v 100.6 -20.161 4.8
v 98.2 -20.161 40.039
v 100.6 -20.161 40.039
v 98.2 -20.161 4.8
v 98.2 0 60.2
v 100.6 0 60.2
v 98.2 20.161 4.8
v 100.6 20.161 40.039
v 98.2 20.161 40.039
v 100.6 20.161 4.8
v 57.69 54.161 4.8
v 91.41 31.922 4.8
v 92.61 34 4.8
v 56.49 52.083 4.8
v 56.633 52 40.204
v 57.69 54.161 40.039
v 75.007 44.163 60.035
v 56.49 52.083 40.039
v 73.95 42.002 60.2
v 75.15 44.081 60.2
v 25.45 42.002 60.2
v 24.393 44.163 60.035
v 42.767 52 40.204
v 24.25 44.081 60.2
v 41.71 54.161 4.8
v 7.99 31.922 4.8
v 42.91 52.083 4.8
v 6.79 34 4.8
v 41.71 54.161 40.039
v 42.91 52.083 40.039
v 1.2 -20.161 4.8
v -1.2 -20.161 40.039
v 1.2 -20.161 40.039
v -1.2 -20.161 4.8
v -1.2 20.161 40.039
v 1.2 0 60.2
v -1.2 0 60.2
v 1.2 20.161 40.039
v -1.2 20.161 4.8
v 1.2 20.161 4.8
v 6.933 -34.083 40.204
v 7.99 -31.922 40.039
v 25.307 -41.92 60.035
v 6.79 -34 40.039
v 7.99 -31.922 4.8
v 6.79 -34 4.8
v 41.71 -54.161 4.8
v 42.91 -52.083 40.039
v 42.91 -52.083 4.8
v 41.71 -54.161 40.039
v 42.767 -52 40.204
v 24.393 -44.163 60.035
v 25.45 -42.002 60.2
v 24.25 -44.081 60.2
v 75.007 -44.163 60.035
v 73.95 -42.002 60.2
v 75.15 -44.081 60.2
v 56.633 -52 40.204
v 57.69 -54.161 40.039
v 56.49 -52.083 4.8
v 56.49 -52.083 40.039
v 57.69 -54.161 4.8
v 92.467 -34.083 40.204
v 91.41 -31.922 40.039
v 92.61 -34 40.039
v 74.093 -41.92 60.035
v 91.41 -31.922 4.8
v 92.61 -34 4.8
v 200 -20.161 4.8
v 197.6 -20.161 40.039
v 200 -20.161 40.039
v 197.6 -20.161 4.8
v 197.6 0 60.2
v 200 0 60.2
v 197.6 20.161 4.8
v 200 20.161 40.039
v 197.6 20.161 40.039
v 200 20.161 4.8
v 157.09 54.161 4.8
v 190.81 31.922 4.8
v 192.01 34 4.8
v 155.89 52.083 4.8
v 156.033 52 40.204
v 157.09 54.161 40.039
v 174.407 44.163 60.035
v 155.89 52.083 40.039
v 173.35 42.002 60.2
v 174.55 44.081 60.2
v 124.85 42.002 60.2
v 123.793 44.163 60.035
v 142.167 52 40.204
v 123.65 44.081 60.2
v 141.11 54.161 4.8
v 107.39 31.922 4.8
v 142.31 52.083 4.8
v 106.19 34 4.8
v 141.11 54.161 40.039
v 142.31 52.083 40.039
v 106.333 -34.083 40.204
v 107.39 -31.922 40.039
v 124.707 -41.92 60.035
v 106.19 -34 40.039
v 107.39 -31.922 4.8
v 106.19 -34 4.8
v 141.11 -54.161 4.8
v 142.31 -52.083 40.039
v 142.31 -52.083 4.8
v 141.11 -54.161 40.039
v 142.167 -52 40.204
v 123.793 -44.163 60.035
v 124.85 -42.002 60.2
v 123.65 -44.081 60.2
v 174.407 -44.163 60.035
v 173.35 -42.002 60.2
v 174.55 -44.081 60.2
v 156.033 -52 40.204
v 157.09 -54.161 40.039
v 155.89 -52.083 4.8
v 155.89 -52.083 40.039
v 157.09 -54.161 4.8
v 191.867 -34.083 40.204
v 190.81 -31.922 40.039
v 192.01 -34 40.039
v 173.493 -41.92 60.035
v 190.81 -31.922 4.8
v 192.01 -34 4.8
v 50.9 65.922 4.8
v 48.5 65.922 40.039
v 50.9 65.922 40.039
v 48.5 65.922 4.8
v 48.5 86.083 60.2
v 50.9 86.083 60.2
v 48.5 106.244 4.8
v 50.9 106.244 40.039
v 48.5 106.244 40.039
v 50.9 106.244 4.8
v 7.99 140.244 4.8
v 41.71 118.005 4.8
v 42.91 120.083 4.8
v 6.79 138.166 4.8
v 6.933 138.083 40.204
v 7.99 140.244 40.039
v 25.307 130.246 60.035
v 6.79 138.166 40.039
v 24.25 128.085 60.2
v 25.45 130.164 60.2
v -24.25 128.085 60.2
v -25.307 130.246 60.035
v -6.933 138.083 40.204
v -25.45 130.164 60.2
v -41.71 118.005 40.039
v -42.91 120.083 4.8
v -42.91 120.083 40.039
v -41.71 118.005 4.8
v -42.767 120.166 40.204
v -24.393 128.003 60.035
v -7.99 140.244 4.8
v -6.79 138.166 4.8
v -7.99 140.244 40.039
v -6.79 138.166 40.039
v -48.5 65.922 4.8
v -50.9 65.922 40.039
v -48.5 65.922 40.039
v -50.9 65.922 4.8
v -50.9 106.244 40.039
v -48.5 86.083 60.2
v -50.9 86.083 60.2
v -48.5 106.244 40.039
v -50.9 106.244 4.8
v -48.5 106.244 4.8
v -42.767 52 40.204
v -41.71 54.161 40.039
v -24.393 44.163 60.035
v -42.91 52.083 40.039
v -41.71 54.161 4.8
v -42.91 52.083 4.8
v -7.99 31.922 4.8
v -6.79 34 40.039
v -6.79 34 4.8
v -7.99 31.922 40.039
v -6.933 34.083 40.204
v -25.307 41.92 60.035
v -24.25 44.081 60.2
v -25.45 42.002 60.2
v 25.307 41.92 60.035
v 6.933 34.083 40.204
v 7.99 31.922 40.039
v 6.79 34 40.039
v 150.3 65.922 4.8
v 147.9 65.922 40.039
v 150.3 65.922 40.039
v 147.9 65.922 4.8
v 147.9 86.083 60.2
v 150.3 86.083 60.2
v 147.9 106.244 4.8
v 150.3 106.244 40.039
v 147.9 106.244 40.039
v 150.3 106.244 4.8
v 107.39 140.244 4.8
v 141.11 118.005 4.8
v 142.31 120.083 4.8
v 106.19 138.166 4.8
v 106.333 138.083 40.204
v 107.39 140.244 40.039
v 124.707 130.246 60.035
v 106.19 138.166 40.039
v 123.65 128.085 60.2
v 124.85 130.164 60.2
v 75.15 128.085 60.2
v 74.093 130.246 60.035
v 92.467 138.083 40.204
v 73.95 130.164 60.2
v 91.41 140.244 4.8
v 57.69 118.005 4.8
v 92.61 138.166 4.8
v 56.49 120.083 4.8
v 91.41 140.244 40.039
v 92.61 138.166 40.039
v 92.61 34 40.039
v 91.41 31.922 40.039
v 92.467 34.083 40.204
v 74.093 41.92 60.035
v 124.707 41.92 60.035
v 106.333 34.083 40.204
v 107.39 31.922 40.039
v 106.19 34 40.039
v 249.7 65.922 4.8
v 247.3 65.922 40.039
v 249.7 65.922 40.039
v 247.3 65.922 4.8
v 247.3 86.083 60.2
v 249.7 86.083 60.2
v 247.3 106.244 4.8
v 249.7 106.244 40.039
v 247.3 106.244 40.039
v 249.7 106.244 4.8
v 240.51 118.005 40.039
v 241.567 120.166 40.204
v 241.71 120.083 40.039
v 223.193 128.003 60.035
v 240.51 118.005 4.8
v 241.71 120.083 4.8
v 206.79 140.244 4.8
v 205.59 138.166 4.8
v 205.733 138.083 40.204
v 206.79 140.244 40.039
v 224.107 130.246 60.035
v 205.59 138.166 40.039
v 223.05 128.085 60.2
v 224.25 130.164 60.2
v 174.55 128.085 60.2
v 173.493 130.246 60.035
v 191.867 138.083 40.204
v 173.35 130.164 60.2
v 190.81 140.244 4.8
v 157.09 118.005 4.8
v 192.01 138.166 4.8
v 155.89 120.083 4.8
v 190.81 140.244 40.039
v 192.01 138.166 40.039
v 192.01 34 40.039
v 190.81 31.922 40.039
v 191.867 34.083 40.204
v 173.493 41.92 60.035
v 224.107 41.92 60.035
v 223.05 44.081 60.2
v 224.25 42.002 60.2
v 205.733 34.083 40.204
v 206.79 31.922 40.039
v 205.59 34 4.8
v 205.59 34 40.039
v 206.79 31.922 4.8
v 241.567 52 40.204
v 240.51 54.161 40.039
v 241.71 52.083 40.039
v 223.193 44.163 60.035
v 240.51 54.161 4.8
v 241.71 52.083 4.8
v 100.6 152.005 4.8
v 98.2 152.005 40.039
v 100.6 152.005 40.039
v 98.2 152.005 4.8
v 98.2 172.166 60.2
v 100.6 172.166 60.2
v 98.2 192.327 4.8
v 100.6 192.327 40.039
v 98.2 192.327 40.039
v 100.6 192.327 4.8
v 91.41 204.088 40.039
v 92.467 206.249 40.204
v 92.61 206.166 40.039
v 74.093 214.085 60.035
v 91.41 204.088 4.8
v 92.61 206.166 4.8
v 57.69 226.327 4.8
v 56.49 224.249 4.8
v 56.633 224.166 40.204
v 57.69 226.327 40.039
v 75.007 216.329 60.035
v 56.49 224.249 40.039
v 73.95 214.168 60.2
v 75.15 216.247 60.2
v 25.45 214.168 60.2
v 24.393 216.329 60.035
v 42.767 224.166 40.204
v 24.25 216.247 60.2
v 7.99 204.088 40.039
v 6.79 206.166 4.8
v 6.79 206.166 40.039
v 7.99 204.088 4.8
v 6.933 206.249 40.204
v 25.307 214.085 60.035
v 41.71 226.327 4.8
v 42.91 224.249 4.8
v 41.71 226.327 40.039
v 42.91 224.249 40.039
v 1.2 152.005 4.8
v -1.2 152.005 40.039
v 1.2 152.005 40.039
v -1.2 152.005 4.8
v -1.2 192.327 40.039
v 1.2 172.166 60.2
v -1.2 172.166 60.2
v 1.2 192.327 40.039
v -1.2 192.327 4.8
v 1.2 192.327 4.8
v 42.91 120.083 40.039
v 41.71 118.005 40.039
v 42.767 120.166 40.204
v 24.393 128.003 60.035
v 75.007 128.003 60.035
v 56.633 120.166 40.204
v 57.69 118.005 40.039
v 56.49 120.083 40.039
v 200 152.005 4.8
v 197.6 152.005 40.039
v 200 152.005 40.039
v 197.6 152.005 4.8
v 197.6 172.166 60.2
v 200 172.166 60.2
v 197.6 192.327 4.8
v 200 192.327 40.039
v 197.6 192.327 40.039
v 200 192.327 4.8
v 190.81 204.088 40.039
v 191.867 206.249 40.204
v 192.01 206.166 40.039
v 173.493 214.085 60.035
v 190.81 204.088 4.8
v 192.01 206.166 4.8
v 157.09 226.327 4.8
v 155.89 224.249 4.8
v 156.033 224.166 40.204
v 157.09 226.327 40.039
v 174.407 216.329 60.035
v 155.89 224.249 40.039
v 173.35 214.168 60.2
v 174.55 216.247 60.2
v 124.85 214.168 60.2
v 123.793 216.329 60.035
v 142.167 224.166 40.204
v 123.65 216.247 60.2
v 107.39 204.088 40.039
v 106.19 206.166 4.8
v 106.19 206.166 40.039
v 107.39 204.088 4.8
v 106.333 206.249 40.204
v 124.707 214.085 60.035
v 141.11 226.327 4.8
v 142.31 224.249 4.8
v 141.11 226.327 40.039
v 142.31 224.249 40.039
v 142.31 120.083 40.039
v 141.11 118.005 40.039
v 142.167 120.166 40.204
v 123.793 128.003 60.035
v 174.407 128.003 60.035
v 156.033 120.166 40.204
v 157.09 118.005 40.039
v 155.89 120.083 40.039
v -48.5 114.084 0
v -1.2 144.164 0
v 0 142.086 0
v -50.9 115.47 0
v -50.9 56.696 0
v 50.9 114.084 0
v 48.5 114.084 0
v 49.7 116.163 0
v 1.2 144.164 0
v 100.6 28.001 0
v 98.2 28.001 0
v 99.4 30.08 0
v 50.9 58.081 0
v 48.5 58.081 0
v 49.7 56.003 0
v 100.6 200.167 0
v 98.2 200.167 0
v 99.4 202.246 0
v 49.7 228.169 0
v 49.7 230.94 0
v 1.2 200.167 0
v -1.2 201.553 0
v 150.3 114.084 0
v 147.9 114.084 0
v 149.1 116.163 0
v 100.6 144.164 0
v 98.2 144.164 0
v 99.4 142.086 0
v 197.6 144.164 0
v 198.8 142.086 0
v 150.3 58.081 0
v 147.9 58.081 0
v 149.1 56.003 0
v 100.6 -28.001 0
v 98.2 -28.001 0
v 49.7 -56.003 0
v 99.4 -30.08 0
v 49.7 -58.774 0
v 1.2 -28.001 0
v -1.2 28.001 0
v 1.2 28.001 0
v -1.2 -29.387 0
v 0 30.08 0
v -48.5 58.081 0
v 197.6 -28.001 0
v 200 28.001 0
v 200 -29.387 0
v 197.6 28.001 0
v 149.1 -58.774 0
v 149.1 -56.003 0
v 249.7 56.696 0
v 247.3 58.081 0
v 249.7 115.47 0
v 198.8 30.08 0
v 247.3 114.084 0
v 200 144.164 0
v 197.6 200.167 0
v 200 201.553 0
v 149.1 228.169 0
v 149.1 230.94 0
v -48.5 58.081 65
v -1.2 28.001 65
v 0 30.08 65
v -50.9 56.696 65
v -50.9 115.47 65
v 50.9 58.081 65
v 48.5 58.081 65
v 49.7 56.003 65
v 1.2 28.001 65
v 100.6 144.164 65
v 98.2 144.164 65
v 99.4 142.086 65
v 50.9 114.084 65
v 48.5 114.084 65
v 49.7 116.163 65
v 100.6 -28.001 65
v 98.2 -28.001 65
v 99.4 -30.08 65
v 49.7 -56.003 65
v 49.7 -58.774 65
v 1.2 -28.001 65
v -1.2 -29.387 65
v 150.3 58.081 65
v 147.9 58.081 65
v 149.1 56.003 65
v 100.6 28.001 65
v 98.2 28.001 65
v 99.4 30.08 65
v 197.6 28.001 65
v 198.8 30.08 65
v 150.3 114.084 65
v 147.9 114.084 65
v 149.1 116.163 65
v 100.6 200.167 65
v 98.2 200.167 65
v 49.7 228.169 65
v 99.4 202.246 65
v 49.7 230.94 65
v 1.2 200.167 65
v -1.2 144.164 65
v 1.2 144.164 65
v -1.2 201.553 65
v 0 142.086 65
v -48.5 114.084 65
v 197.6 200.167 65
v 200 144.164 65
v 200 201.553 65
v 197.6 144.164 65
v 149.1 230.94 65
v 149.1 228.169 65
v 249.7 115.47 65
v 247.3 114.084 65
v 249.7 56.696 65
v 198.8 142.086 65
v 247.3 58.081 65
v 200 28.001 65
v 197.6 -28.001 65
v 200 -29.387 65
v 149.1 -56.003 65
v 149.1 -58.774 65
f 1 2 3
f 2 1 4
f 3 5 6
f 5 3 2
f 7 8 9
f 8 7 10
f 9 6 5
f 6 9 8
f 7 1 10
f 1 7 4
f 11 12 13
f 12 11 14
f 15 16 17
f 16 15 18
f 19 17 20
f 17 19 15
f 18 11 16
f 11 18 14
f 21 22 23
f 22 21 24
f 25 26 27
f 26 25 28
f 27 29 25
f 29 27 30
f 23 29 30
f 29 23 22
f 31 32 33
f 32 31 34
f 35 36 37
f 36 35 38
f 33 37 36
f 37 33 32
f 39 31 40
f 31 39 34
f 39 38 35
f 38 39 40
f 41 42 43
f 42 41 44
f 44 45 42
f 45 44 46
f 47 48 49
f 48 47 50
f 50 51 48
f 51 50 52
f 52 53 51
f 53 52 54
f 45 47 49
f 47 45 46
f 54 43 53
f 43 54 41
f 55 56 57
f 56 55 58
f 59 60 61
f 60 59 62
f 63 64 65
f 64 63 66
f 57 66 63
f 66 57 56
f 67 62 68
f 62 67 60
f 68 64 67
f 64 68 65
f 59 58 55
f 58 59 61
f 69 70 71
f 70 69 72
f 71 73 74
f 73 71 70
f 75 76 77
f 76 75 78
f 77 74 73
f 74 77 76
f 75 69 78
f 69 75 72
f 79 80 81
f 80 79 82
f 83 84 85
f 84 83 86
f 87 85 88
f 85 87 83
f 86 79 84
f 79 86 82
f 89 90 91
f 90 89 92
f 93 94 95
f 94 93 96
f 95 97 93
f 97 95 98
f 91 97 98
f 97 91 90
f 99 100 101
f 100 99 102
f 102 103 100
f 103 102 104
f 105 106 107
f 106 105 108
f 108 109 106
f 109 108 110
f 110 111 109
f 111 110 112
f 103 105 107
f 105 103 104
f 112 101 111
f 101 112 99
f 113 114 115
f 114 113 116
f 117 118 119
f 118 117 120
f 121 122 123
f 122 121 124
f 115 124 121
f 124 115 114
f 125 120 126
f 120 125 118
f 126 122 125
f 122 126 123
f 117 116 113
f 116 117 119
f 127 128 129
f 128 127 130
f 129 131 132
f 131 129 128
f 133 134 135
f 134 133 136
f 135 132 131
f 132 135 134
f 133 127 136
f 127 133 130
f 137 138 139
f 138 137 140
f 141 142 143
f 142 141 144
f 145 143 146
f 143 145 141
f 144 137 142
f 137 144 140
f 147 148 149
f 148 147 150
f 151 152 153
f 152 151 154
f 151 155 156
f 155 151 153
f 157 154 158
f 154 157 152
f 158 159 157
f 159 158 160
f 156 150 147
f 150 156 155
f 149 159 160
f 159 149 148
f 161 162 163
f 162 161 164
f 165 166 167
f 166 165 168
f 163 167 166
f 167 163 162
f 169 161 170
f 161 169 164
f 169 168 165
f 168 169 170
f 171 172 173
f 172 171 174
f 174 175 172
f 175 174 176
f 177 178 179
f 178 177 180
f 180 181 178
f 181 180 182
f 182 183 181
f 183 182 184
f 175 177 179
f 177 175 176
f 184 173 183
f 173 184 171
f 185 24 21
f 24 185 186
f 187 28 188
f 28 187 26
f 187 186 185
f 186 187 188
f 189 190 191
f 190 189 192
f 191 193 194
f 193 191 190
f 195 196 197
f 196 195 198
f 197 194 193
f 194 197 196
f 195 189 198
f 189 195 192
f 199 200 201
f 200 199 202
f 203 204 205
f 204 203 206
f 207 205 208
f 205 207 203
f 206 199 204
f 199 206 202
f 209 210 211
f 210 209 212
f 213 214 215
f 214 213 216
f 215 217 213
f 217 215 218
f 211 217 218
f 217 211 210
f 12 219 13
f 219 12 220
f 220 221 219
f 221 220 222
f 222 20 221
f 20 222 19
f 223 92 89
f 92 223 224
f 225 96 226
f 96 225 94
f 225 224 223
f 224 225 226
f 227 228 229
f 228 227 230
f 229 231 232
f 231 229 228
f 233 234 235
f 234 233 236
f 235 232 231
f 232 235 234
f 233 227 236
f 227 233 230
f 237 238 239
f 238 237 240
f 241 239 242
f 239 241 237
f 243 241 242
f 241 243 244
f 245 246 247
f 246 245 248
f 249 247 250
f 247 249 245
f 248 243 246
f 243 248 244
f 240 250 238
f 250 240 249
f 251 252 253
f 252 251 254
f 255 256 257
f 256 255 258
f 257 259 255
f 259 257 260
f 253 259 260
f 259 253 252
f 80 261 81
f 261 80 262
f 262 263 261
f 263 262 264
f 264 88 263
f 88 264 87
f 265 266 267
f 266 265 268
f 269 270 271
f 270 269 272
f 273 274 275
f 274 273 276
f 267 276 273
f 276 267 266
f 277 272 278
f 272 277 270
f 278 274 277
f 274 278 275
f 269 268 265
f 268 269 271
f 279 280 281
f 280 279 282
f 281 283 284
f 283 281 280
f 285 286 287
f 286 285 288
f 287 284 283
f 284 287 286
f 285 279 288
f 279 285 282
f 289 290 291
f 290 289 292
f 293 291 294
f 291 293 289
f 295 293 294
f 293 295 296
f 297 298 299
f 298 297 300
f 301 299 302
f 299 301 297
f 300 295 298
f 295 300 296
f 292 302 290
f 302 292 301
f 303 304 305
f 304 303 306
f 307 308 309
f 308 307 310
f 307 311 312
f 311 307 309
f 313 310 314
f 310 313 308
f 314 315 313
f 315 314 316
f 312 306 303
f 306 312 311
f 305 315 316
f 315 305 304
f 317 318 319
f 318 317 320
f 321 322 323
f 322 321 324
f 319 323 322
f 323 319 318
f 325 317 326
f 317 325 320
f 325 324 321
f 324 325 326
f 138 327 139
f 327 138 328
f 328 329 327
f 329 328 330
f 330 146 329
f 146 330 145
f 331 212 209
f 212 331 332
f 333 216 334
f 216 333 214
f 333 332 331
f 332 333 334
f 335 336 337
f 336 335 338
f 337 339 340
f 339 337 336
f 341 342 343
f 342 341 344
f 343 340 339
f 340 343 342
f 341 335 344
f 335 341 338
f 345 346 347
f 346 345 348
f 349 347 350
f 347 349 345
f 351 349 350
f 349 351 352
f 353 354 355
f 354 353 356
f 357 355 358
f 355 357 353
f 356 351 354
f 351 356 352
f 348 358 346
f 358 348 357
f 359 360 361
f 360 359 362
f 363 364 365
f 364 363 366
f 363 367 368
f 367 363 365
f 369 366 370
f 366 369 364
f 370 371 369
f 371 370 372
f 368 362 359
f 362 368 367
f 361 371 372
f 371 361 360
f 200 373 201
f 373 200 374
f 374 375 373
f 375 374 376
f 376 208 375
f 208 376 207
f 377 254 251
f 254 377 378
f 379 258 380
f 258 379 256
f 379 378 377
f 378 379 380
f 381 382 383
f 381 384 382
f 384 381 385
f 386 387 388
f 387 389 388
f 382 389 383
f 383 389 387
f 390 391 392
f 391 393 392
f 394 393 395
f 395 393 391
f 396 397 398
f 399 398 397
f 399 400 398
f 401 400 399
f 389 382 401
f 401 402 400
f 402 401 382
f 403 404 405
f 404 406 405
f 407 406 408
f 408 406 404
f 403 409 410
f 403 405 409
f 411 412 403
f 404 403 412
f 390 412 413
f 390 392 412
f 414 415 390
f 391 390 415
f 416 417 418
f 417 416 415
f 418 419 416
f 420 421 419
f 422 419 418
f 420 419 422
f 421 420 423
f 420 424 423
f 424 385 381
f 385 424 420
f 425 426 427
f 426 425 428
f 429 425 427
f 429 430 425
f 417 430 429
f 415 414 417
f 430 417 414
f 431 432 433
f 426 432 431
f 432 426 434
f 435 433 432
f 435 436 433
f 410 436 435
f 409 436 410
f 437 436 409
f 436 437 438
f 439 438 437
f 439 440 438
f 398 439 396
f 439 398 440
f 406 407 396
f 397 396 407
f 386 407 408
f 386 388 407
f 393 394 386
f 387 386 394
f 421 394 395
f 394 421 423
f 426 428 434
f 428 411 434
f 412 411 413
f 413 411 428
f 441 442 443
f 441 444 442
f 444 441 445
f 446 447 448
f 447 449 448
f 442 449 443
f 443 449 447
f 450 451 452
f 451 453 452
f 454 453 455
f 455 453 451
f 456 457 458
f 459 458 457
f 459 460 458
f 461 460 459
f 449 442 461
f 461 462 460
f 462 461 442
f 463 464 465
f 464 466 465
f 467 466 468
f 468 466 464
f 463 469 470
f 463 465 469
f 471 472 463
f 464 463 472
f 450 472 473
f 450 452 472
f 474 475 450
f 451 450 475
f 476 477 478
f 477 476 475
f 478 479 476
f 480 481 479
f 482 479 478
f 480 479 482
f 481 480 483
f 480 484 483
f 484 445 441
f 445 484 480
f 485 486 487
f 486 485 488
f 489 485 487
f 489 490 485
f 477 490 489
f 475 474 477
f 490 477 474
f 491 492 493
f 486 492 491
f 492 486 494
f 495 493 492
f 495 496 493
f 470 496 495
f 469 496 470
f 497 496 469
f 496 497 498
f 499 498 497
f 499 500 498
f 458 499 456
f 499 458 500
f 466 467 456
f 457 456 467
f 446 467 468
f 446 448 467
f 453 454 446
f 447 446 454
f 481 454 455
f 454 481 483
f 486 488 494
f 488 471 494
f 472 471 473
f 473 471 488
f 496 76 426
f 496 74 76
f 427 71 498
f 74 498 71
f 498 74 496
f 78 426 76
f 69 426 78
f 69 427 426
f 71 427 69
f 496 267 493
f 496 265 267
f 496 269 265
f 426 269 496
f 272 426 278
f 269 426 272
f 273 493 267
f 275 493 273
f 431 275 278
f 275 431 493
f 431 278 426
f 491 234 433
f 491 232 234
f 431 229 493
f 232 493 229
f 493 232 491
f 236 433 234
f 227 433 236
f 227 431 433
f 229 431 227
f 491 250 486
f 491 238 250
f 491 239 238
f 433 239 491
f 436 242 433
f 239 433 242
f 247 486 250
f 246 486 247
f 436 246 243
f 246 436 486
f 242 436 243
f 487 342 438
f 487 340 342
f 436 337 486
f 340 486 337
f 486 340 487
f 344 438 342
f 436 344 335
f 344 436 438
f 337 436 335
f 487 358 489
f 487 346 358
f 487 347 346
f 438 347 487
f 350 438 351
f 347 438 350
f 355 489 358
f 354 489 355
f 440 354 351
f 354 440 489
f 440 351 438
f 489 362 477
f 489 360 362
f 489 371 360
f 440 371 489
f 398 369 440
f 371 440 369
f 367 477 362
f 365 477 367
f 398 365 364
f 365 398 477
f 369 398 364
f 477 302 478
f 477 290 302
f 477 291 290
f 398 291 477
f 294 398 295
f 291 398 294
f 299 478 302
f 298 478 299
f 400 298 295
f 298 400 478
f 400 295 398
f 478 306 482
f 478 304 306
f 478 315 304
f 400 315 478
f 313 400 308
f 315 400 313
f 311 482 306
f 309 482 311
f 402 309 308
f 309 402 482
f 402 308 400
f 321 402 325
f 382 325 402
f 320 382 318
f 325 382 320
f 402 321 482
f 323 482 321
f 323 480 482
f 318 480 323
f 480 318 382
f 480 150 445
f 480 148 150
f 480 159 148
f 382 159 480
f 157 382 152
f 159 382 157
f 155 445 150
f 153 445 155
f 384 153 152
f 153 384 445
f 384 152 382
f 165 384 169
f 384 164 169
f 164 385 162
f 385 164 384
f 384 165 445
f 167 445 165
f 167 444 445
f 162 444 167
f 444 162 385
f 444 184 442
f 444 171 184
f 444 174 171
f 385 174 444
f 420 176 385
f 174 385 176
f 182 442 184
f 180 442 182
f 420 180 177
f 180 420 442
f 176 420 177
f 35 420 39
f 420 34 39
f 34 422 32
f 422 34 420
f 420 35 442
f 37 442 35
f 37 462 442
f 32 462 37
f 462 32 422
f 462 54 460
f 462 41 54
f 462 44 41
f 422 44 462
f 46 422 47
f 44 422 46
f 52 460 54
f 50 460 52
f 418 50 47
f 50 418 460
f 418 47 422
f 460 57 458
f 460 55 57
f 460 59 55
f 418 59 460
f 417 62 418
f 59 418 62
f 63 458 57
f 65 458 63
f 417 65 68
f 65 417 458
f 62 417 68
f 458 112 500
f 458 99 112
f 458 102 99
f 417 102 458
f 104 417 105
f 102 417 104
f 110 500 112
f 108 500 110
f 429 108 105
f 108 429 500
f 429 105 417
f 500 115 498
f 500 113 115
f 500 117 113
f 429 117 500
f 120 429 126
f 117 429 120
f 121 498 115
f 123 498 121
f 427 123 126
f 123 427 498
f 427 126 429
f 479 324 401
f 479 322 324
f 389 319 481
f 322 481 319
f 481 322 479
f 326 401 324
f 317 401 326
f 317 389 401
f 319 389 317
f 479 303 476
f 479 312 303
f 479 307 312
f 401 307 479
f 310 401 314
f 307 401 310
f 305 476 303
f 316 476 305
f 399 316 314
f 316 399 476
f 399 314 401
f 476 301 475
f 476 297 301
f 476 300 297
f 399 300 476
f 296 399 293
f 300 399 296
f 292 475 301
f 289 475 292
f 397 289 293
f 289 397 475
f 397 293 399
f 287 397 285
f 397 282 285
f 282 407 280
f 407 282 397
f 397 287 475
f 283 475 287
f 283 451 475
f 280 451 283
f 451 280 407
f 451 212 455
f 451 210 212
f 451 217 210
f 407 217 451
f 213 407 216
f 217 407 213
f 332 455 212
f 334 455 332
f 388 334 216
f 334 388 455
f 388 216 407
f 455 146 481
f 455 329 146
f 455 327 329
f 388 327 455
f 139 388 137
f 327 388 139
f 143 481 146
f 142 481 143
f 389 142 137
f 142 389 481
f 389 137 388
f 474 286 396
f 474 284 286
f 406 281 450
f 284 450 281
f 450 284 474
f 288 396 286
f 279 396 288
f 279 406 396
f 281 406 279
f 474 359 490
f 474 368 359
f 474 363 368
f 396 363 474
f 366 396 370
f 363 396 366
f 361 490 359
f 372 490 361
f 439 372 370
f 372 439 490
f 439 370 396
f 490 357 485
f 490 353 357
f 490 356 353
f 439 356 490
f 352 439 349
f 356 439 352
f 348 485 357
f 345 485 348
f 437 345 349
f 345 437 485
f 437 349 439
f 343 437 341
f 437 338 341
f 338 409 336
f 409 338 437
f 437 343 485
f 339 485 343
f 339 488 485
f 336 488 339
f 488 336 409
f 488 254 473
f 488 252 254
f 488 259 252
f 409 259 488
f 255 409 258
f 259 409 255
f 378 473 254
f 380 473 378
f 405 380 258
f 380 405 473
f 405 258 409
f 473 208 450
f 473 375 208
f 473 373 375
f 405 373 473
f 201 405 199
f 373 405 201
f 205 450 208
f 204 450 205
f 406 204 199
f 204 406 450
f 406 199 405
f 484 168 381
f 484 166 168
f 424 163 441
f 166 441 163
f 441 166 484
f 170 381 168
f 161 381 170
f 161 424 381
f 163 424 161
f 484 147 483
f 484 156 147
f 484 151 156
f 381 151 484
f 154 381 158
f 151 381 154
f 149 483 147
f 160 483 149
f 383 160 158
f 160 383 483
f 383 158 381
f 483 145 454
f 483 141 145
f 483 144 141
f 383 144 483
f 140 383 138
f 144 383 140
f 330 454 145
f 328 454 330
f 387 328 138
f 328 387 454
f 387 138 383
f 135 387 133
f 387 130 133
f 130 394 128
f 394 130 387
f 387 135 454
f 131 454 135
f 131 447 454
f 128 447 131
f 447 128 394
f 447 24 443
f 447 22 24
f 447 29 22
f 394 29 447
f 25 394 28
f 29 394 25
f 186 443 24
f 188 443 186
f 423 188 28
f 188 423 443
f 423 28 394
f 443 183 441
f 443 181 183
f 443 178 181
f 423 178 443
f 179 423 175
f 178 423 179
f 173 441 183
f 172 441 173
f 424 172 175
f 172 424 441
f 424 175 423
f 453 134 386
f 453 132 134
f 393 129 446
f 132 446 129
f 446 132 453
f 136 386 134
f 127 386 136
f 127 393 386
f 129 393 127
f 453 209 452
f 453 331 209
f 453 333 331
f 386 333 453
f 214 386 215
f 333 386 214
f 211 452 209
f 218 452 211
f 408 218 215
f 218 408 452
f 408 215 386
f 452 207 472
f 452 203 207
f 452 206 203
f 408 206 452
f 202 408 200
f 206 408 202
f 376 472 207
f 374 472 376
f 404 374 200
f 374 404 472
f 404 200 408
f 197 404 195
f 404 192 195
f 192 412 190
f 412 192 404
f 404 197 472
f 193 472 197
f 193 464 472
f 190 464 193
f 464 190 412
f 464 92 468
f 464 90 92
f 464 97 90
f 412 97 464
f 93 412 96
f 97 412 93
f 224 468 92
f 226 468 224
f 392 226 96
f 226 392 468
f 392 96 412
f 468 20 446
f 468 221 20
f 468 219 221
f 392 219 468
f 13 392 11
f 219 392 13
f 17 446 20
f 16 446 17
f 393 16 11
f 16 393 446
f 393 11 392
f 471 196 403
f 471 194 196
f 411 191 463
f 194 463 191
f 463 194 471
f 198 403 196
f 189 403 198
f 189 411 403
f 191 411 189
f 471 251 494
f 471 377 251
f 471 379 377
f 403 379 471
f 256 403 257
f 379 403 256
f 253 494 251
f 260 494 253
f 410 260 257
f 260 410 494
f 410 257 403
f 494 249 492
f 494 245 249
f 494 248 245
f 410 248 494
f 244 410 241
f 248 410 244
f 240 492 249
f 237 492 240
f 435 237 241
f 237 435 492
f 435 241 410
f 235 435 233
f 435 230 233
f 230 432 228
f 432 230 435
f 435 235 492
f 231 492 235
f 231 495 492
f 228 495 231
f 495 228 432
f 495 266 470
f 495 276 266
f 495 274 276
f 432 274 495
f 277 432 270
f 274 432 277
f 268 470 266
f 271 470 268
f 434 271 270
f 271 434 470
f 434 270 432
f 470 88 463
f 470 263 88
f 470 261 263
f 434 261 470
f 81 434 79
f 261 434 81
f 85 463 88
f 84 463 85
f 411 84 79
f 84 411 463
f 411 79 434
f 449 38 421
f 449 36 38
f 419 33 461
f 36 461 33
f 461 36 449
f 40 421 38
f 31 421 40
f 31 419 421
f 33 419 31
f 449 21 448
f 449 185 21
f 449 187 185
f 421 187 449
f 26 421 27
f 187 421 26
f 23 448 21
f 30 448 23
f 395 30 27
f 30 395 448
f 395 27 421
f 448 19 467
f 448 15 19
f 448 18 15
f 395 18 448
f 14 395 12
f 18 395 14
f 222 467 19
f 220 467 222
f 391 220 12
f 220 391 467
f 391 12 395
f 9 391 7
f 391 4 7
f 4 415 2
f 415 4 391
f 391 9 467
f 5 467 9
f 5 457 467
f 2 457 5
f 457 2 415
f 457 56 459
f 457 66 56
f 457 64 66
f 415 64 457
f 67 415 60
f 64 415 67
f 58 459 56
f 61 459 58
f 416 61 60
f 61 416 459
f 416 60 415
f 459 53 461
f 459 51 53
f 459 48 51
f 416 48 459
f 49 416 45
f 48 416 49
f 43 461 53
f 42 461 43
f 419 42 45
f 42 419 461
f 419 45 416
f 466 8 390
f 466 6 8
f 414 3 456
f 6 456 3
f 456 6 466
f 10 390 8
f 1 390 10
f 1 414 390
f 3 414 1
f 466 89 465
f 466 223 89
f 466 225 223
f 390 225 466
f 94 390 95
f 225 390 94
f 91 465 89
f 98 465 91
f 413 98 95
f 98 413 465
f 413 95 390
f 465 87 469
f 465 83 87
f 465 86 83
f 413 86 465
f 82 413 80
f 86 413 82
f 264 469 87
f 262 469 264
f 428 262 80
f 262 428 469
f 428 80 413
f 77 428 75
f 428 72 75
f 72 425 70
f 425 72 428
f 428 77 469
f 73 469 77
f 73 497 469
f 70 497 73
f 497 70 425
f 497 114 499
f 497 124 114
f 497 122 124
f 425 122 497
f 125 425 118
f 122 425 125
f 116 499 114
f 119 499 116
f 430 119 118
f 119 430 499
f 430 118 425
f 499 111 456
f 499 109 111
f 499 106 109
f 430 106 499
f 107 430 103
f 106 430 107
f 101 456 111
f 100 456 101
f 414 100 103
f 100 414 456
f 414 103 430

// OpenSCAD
// Open-bottom bottle separator. All dimensions are in millimetres.

/* [Arrangement] */
// Honeycomb staggers hexagons. Inline aligns square cells in both directions.
layout = "Honeycomb"; // [Honeycomb, Inline]
// Number of rows from front to back.
rows = 3; // [1:1:12]
// Bottles in a full row. In a honeycomb, alternating rows hold one fewer.
bottles_per_row = 3; // [1:1:12]

/* [Bottle fit] */
// Widest outside diameter of the bottle body. Measure yours before printing.
bottle_diameter = 95; // [20:0.5:160]
// Free space from the bottle to each flat wall.
side_clearance = 1; // [0:0.1:5]
// Shared divider thickness when Bottle gap is zero.
wall_thickness = 2.4; // [1:0.1:6]
// Centered glass-to-glass gap. Zero uses Wall thickness. Otherwise allow both side clearances plus at least 1 mm of wall.
bottle_gap = 0; // [0:0.1:20]
// Height above the bath floor. Keep the upper rim on the straight bottle body.
guide_height = 65; // [15:1:160]

/* [Small bed printing] */
// Print one identical cell per bottle, then slide the joints together vertically. Print the test pair first.
output_part = "Whole rack"; // [Whole rack, Print one cell, Joint test pair, Modular layout]
// Space on each dovetail flank. Adjust after printing the test pair in the intended filament.
joint_clearance = 0.25; // [0.10:0.05:0.45]
// Usable rectangular bed dimensions, after allowing for brims, clips and edge margins.
bed_width = 180; // [30:1:500]
// Usable front-to-back dimension, measured after the same allowances.
bed_depth = 180; // [30:1:500]

/* [Hidden] */
// Use flat-to-flat dimensions so the bottle fit is identical in either layout.
module cell_outline(across_flats) {
    rotate(180 / sides)
        circle(d = across_flats / cos(180 / sides), $fn = sides);
}

hexagonal = layout == "Honeycomb";
sides = hexagonal ? 6 : 4;
opening = bottle_diameter + 2 * side_clearance;
// Rounding the difference avoids rejecting a 1 mm wall at decimal settings.
divider = bottle_gap == 0 ? wall_thickness : round((bottle_gap - 2 * side_clearance) * 1000) / 1000;
pitch = opening + divider;
row_pitch = hexagonal ? pitch * sin(60) : pitch;
epsilon = 0.02;

// Start the seven-cell cluster with a short row so its centre row is widest.
function staggered(r) = hexagonal && rows > 1 && r % 2 == 0;
function row_size(r) = staggered(r) ? max(1, bottles_per_row - 1) : bottles_per_row;
function cell_center(r, c) = [(c + (staggered(r) ? 0.5 : 0)) * pitch, r * row_pitch];

module cell_array() {
    for (r = [0 : rows - 1], c = [0 : row_size(r) - 1])
        translate(cell_center(r, c)) children();
}

module wall_network() {
    linear_extrude(guide_height)
        difference() {
            union() { cell_array() cell_outline(opening + 2 * divider); }
            cell_array() cell_outline(opening);
        }
}

// A pointed roof closes each flow window at 45 degrees. Continuous rims at
// two heights guide the glass, and the open base lets it sit on the bath floor.
module flow_window(span_limit = undef) {
    rim = min(guide_height / 5, 2 * divider);
    peak = guide_height - rim;
    face_width = opening * tan(180 / sides);
    full_span = min(0.36 * face_width, 0.4 * (peak - rim));
    half_span = is_undef(span_limit) ? full_span : min(full_span, span_limit);
    depth = divider + 2 * epsilon;

    translate([pitch / 2, 0, 0])
        rotate([90, 0, 90])
            linear_extrude(depth, center = true)
                polygon([[-half_span, rim], [half_span, rim],
                         [half_span, peak - half_span], [0, peak],
                         [-half_span, peak - half_span]]);
}

assert(divider >= 1, str("Bottle gap must be at least ", 2 * side_clearance + 1,
                         " mm for this clearance, or zero to use Wall thickness."));
echo(str("Cell opening ", opening, " mm; divider ", divider, " mm; centered bottle gap ",
         pitch - bottle_diameter, " mm; center spacing ", pitch, " mm."));

module whole_rack() {
    difference() {
        wall_network();
        cell_array()
            for (face = [0 : sides - 1])
                rotate(360 * face / sides) flow_window();
    }
}

// Each modular face owns half a divider. Facing cells have opposite local Y
// axes, so one layout of tongues (+Y) and grooves (-Y) mates on every side.
face_x = pitch / 2;
key_depth = 1.8;
key_neck = 1.3;  // half-widths
key_head = 2.5;
backing = 1.2;
pad_width = key_head + joint_clearance + backing;
pad_depth = max(divider / 2, key_depth + joint_clearance + backing);
key_y = opening / 2 * tan(180 / sides) - pad_width - 0.7;
window_limit = key_y - pad_width - 1;
coupon_half = pad_width + 1;

// Use the same trapezoid for the rail and the relieved socket. The extension
// behind the seam joins the rail to its cell and opens the mouth of the socket.
rail_points = [[-0.5, -key_neck], [0, -key_neck], [key_depth, -key_head],
               [key_depth, key_head], [0, key_neck], [-0.5, key_neck]];

module on_faces() {
    for (i = [0 : sides - 1])
        rotate(i * 360 / sides) translate([face_x, 0]) children();
}

module socket() {
    mirror([1, 0]) offset(delta = joint_clearance) polygon(rail_points);
}

module module_profile() {
    difference() {
        union() {
            difference() {
                cell_outline(pitch);
                cell_outline(opening);
            }
            intersection() {
                cell_outline(pitch);
                on_faces() translate([-pad_depth, -key_y - pad_width])
                    square([pad_depth, 2 * pad_width]);
            }
            on_faces() translate([0, key_y]) polygon(rail_points);
        }
        on_faces() translate([0, -key_y]) socket();
    }
}

module print_cell() {
    difference() {
        linear_extrude(guide_height) module_profile();
        for (i = [0 : sides - 1])
            rotate(360 * i / sides) flow_window(window_limit);
    }
}

module joint_sample(side) {
    // Keep the same rail, groove and wall backing, on short flat strips.
    linear_extrude(min(12, guide_height)) {
        if (side == 1) union() {
            translate([-divider/2, -coupon_half]) square([divider/2, 2*coupon_half]);
            polygon(rail_points);
        } else difference() {
            translate([-pad_depth, -coupon_half]) square([pad_depth, 2*coupon_half]);
            socket();
        }
    }
}

function rotated(p, a) = [p.x*cos(a) - p.y*sin(a), p.x*sin(a) + p.y*cos(a)];
// The outside envelope consists of the original polygon plus the rail tips.
outline_points = [for (i = [0 : sides-1],
                   p = concat([[face_x, face_x * tan(180/sides)]],
                              [for (v = rail_points) [face_x+v.x, key_y+v.y]]))
                       rotated(p, i * 360/sides)];
function extent(points, axis) = max([for (p = points) p[axis]]) - min([for (p = points) p[axis]]);
cell_size = [extent(outline_points, 0), extent(outline_points, 1)];
module fit_bed(size) {
    straight = size.x <= bed_width && size.y <= bed_depth;
    turned = size.y <= bed_width && size.x <= bed_depth;
    assert(straight || turned, str("Part needs ", size.x, " x ", size.y,
           " mm before brim. Usable bed is ", bed_width, " x ", bed_depth, " mm."));
    rotate(straight ? 0 : 90) children();
}

module modular_output() {
    // Check the inner corner of the socket backing against the full circular
    // opening (bottle plus clearance), and keep the flow window off the rail.
    assert(window_limit > 1 && norm([face_x-pad_depth, key_y-pad_width]) >= opening/2,
           "Insufficient corner room for these keys. Increase divider thickness or use the whole rack.");
    if (output_part == "Joint test pair") {
        fit_bed([pad_depth + key_depth, 4*coupon_half + 3]) {
            joint_sample(1);
            translate([0, 2*coupon_half + 3]) joint_sample(-1);
        }
    } else if (output_part == "Print one cell") {
        fit_bed(cell_size) print_cell();
    } else {
        cell_array() print_cell();
    }
}

color([0.12, 0.55, 0.58])
    if (output_part == "Whole rack") whole_rack();
    else modular_output();
